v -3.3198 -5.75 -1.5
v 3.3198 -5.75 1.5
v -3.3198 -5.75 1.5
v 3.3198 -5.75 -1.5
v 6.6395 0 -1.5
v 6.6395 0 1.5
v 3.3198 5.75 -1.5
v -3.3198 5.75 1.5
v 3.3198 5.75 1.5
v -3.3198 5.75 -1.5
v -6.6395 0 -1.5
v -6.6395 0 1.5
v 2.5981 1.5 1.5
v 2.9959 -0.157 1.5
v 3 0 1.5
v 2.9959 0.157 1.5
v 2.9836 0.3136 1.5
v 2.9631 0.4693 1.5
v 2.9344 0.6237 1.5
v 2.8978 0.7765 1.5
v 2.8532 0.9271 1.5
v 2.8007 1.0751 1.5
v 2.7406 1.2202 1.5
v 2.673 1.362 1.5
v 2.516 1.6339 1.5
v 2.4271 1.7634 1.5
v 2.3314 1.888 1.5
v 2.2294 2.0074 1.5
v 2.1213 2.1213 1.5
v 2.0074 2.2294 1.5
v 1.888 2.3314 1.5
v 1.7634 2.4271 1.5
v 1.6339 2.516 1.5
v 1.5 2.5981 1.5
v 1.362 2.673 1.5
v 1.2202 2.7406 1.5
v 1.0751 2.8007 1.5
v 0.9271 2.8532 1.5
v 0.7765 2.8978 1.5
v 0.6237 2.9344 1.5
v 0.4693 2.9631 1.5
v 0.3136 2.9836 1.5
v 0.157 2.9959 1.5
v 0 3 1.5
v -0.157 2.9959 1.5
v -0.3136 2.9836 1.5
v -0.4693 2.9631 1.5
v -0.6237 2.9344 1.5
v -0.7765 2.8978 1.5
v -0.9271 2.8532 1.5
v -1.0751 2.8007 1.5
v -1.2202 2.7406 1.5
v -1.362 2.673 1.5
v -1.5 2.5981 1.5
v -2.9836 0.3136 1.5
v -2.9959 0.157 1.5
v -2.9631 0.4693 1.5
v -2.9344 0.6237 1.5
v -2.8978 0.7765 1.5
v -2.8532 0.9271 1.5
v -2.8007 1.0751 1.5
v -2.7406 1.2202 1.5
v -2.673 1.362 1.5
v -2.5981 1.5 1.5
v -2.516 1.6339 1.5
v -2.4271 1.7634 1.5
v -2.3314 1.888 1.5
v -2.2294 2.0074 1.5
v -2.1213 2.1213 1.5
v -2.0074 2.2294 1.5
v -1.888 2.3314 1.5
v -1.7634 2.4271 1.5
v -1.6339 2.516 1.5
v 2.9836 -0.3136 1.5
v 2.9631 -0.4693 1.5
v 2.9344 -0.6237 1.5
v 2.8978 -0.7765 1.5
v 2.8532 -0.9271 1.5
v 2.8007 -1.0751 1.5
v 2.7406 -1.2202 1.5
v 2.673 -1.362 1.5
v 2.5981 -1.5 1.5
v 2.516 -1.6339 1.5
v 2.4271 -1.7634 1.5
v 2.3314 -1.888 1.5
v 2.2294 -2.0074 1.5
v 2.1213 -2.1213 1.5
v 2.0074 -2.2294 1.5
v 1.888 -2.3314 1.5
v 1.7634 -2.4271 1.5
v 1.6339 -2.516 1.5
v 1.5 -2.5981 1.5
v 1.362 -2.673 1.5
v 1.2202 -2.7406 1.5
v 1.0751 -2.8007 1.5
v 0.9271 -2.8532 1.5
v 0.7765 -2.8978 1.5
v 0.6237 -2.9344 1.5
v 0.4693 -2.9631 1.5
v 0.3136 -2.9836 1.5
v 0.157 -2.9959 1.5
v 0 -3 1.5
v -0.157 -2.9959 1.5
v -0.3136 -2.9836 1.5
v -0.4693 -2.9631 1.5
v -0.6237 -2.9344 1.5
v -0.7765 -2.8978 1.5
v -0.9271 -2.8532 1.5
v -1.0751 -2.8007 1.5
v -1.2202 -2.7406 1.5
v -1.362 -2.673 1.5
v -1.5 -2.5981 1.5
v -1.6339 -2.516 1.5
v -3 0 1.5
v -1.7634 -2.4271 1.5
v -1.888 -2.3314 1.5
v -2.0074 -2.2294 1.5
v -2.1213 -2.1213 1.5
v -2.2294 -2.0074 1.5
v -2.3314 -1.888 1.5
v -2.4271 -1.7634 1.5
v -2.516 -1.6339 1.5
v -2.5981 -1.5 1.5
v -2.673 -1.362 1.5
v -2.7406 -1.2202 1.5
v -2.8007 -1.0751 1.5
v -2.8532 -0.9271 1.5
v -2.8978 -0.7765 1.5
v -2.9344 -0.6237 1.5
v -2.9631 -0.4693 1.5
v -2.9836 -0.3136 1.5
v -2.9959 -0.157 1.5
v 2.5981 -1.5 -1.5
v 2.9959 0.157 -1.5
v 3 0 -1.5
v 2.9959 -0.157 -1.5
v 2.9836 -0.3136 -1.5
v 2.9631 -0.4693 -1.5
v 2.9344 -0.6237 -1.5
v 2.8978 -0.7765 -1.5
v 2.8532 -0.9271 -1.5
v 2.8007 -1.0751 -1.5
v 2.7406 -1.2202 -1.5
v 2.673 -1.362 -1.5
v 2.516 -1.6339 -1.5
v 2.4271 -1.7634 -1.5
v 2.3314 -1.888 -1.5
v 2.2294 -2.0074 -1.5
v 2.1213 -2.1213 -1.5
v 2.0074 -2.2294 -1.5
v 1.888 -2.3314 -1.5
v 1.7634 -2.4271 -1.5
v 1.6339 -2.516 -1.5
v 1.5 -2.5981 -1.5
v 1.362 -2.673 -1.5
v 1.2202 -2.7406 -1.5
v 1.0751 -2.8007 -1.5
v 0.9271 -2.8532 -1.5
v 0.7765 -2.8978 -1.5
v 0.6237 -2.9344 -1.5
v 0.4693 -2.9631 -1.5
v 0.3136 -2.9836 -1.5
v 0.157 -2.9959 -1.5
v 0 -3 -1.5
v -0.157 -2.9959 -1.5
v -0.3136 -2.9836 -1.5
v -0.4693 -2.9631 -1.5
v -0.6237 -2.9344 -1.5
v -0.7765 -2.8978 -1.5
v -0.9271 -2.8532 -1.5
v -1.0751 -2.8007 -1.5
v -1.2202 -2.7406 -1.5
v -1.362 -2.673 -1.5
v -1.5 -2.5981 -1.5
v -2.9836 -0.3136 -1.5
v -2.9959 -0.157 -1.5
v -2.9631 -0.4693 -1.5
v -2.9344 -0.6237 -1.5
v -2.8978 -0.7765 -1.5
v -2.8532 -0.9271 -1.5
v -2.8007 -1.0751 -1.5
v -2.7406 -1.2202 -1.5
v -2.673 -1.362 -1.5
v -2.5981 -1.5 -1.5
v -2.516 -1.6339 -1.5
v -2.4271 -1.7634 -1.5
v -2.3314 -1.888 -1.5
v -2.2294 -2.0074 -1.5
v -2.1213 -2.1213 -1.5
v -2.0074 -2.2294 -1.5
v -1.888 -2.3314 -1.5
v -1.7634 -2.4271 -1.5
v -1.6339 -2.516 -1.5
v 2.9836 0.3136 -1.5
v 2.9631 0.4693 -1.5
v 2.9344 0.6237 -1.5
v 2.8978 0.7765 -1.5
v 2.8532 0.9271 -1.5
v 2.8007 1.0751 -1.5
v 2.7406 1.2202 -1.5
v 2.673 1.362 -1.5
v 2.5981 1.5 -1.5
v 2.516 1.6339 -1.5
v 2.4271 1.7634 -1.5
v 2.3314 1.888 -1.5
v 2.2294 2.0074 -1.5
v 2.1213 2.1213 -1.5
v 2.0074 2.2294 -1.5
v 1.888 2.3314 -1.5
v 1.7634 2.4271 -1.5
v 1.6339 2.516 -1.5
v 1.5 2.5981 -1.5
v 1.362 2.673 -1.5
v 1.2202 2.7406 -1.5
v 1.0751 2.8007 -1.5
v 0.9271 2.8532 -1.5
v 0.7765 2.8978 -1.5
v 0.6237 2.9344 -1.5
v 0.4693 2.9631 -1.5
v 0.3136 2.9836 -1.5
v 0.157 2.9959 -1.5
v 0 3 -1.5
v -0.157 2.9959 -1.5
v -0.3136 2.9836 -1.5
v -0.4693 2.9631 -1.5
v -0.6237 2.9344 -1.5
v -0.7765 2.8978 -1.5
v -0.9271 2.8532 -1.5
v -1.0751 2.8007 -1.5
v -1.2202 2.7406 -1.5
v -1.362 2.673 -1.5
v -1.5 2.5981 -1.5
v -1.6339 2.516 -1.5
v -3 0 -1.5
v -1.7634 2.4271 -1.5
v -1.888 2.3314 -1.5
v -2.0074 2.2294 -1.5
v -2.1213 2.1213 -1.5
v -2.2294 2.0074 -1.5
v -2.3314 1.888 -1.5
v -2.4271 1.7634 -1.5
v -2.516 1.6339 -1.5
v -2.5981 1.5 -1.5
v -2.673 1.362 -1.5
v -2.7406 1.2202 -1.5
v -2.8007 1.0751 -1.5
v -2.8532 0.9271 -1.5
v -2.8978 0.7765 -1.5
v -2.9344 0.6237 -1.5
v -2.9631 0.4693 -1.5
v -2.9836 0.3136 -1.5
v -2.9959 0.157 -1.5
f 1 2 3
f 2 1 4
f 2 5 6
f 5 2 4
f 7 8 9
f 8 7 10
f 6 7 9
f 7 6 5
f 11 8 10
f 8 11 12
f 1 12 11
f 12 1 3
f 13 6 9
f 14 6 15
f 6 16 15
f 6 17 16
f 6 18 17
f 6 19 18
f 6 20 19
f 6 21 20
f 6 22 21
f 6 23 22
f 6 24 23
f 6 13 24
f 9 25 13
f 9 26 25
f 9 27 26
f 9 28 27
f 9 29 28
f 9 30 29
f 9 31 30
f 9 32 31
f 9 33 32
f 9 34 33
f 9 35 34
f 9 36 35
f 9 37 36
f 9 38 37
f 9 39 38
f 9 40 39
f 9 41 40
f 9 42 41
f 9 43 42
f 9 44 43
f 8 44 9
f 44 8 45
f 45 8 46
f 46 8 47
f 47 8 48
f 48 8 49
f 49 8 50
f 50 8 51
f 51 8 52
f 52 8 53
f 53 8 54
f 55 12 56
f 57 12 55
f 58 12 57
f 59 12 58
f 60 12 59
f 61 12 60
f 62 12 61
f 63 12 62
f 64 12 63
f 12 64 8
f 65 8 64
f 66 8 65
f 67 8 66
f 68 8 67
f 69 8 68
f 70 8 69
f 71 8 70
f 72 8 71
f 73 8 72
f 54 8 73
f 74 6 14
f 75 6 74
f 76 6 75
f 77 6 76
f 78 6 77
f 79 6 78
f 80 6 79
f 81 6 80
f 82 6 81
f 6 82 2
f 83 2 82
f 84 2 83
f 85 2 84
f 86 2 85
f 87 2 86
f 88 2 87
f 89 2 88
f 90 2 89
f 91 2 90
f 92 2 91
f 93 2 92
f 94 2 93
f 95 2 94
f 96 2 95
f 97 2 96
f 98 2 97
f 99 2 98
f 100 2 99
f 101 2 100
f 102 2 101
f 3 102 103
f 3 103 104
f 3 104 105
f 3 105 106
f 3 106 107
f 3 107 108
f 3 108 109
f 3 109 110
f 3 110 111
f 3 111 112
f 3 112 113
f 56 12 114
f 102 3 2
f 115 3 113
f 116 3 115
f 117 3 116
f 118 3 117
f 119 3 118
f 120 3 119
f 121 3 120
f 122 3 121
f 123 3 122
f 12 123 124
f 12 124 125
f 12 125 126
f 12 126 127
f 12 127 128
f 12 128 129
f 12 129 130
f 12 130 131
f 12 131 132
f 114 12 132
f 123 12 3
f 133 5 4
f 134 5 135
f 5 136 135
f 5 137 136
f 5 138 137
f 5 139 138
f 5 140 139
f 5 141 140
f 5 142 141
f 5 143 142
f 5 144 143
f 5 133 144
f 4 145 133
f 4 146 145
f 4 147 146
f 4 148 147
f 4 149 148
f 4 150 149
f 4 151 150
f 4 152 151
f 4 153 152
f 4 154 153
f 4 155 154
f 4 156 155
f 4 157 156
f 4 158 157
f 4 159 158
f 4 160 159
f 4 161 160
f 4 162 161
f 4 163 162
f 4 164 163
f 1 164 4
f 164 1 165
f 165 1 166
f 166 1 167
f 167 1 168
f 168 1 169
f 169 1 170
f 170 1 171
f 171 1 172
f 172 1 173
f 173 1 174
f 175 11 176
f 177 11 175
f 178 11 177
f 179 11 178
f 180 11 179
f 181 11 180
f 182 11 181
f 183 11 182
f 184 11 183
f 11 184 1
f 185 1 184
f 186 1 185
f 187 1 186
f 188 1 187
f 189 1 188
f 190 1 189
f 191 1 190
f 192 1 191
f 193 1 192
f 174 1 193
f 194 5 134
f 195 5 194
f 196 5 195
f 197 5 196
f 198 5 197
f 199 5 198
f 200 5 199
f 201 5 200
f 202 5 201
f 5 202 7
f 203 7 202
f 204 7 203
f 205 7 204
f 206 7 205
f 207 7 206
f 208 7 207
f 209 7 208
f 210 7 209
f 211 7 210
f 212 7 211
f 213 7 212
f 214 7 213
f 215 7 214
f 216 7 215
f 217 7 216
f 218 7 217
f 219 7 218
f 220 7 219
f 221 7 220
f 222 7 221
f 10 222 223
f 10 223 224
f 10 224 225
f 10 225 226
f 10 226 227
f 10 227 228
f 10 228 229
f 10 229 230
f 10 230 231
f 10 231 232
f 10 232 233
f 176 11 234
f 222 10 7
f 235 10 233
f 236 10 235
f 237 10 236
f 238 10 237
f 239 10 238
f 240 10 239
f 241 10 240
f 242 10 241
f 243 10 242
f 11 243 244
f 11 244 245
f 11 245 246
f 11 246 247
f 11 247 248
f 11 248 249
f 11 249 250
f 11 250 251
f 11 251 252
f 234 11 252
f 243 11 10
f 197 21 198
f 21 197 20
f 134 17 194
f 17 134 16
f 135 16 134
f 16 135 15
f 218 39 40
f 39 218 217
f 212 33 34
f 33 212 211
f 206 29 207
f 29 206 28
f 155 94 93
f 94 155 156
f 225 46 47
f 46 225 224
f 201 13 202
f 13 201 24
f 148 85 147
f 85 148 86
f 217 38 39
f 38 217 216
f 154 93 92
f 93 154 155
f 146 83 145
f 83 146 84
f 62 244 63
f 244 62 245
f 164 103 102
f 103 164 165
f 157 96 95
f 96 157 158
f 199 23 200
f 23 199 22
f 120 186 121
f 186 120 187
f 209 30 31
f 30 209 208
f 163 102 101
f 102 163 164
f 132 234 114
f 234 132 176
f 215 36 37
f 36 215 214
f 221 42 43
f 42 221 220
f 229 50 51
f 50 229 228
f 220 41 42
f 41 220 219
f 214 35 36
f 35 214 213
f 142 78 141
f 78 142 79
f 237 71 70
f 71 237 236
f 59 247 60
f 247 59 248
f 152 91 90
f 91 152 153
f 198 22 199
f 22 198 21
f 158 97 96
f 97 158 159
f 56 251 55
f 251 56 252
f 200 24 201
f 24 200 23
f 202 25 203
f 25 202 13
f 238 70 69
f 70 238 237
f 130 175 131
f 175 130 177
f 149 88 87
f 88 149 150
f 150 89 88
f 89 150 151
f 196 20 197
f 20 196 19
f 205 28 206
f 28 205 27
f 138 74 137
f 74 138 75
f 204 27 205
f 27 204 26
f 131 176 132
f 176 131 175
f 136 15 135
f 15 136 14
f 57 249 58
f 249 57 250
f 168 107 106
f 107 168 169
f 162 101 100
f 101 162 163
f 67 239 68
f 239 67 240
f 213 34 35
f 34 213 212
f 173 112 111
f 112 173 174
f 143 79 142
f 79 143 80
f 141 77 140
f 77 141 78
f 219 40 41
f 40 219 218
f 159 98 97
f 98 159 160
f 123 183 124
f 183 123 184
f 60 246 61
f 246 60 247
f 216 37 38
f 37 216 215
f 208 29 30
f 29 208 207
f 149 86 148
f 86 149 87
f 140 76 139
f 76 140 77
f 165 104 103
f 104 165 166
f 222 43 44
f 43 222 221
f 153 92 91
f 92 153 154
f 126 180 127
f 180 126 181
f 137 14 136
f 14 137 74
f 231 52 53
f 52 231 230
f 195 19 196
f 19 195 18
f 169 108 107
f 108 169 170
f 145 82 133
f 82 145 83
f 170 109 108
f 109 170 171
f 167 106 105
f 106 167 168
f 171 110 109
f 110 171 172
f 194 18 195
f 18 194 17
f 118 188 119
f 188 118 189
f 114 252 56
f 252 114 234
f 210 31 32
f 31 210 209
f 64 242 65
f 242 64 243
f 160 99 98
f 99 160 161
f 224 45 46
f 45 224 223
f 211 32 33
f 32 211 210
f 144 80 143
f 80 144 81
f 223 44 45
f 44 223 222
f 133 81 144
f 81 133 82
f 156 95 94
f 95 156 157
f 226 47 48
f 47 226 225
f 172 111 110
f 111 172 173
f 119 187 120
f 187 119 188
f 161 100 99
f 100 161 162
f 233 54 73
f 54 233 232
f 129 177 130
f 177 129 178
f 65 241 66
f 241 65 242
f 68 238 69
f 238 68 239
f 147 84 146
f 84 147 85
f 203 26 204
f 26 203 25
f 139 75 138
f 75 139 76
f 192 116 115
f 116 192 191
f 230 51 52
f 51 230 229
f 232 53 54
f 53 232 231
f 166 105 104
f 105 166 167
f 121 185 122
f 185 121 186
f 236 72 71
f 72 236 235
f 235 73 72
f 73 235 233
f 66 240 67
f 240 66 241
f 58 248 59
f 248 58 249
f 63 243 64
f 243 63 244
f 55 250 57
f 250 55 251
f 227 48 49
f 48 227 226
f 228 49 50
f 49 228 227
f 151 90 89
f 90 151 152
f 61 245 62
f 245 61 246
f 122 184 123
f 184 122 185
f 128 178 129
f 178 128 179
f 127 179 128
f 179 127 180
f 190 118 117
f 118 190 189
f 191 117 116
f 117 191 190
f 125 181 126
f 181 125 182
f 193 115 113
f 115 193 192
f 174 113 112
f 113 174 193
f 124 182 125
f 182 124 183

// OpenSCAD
$fn = 120;

// Target dimensions
af = 11.5;          // across flats (mm)
thk = 3.0;          // thickness (mm)
screw_d = 6.0;      // through-hole diameter (mm)

// Small overlap to ensure watertight boolean ops
eps = 0.02;

// Derived
R = af / sqrt(3);   // circumradius for a true hex with given across-flats

module hex_prism(h) {
    // Use cylinder with $fn=6 for a crisp hex profile
    cylinder(h=h, r=R, $fn=6, center=true);
}

module through_hole(h) {
    cylinder(h=h, r=screw_d/2, center=true);
}

module hex_nut() {
    difference() {
        hex_prism(thk);
        through_hole(thk + 2*eps);
    }
}

hex_nut();
